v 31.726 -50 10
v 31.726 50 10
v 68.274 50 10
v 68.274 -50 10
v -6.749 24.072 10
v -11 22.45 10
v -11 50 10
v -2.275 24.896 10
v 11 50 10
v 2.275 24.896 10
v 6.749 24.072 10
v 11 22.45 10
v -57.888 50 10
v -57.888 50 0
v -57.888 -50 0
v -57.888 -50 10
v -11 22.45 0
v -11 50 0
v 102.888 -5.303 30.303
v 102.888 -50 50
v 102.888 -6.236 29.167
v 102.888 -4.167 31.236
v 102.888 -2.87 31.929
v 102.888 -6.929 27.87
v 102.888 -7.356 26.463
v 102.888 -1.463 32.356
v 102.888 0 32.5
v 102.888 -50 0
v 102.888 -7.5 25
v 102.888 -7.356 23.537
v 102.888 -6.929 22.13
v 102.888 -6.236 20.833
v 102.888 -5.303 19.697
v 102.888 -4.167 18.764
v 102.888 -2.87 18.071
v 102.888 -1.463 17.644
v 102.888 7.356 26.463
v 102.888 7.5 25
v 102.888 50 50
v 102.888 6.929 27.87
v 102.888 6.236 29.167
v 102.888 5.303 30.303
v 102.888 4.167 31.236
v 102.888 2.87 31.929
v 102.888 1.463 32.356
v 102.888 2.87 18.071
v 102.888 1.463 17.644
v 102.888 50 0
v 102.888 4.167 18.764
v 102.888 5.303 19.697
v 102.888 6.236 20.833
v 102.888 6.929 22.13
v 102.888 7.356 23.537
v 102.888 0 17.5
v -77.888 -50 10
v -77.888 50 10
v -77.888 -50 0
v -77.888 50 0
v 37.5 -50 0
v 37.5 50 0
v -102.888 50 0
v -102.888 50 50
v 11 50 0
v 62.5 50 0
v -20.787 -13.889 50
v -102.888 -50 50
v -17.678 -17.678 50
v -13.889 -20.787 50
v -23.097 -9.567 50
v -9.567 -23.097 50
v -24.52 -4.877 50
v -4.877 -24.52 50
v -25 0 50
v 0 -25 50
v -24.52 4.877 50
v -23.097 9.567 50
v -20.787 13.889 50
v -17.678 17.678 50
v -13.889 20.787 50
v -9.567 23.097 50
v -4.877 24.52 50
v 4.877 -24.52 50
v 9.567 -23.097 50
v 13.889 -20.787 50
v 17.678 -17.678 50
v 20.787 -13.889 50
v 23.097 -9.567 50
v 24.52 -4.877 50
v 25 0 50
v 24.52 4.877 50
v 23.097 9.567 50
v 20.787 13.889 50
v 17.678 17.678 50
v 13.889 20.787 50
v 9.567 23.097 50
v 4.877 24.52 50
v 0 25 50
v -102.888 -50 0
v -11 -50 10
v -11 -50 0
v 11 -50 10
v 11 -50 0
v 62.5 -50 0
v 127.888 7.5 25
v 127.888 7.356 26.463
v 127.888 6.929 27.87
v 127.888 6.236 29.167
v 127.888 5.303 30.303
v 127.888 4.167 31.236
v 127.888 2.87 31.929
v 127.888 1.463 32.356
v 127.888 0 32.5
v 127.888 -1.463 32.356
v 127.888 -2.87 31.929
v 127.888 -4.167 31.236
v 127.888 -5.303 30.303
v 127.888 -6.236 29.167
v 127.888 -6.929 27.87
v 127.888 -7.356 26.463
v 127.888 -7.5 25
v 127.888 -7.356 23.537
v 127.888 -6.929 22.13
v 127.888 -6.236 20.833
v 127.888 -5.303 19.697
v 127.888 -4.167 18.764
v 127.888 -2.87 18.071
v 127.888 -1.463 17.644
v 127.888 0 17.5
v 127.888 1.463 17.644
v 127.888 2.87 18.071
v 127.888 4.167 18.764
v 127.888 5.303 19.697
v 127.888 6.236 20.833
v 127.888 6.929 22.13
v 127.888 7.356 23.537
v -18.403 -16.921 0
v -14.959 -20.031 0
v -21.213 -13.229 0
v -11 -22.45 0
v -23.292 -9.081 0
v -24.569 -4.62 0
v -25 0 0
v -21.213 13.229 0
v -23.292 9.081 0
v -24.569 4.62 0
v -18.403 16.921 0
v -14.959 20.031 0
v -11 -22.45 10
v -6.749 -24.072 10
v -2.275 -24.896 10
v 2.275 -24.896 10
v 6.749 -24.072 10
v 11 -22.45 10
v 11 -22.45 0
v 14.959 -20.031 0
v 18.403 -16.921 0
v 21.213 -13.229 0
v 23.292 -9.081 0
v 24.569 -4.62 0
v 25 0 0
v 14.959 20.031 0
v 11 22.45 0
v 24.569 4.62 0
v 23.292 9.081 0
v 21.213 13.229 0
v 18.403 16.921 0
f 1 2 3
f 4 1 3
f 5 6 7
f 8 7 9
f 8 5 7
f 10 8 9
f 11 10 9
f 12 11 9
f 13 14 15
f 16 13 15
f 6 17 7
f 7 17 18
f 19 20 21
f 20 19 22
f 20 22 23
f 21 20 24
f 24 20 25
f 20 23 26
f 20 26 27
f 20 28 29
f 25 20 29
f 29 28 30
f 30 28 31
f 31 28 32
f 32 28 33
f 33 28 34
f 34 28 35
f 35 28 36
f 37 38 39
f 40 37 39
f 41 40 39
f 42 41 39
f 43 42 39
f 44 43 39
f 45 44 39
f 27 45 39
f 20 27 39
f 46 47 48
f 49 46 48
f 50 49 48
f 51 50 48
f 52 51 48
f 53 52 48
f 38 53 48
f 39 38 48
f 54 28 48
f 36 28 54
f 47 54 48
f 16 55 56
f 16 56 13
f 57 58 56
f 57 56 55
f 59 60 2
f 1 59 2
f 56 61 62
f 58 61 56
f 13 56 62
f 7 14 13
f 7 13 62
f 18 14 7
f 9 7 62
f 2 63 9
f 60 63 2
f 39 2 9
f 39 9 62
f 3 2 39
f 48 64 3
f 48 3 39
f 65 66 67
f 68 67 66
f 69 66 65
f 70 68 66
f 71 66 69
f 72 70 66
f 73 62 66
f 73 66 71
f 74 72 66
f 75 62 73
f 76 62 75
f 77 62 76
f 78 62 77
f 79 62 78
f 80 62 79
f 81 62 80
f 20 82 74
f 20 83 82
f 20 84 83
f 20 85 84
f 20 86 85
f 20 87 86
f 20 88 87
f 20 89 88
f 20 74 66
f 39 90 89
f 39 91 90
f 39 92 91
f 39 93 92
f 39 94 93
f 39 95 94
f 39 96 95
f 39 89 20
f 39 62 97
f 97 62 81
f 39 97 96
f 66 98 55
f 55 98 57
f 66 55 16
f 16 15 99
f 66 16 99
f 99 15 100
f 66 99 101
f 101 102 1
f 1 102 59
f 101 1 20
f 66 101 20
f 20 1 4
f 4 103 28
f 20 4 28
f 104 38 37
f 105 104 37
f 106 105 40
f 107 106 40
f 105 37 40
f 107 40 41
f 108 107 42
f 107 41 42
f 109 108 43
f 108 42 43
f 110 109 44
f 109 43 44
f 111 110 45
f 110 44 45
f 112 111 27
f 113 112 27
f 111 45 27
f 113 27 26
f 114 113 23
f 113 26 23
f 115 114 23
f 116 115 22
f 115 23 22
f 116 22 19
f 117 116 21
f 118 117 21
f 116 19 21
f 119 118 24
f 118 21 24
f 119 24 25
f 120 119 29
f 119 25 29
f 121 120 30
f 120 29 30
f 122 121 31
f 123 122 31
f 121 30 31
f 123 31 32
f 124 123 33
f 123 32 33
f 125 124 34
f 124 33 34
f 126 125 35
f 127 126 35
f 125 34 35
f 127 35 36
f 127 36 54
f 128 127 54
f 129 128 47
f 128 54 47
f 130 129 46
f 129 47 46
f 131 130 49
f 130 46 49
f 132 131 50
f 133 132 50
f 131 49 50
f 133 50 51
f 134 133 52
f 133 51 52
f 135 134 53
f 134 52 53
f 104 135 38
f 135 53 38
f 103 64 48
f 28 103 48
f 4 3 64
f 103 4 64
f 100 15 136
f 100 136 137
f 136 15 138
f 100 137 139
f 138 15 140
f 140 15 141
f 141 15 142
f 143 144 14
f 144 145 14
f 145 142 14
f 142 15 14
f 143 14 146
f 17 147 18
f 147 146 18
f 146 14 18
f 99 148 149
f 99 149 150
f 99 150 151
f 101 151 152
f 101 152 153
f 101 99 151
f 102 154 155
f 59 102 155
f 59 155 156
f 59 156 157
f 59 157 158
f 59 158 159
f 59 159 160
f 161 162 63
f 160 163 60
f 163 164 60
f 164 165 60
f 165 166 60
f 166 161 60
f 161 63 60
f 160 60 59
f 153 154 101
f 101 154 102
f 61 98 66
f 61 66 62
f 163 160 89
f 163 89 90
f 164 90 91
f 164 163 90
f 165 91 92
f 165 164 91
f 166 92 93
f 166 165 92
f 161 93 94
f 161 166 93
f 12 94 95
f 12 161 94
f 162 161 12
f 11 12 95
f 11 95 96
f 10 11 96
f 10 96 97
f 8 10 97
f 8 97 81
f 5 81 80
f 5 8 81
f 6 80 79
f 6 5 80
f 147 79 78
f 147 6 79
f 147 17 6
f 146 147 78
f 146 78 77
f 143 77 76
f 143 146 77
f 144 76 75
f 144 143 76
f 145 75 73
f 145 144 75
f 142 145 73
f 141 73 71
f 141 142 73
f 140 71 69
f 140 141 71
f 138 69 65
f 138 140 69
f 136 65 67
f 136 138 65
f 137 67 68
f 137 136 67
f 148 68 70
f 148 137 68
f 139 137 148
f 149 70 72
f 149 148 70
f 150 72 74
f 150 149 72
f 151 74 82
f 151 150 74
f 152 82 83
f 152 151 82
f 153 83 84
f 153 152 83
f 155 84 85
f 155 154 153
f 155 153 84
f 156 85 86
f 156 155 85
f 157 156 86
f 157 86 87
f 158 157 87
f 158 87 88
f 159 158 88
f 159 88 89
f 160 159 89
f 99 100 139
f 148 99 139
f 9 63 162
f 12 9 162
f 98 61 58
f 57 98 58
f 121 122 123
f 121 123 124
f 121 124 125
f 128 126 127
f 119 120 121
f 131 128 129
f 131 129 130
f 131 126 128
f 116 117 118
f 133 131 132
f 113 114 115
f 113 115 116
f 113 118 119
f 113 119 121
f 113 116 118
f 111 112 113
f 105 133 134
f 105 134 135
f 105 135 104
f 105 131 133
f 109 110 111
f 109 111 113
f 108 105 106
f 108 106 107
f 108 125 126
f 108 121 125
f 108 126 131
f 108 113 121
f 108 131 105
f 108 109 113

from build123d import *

# Parameters (mm, degrees)
F0_W     = 205.775664
F0_H     = 100
F0_R     = 25
F1_DEPTH = 50
F2_W     = 20
F2_H     = 100
F3_DEPTH = 10
F5_DEPTH = 100.001
F6_R     = 7.5
F7_DEPTH = 25


with BuildPart() as f1:
    # F0 (on Top) → F1 (new body)
    with BuildSketch(Plane.XY):
        Rectangle(F0_W, F0_H)
        Circle(F0_R, mode=Mode.SUBTRACT)
    extrude(amount=F1_DEPTH)

    # F2 (on face) → F3 (cut)
    with BuildSketch(Plane(origin=(0, 0, 0), x_dir=(1, 0, 0), z_dir=(0, 0, -1))):
        with Locations((-67.887832, 0)):
            Rectangle(F2_W, F2_H)
        with BuildLine():
            Line((11, 50), (-11, 50))
            Line((-11, 50), (-11, 22.449944))
            ThreePointArc((-11, 22.449944), (0, 25), (11, 22.449944))
            Line((11, 22.449944), (11, 50))
        make_face()
        with BuildLine():
            Line((-11, -22.449944), (-11, -50))
            Line((-11, -50), (11, -50))
            Line((11, -50), (11, -22.449944))
            ThreePointArc((11, -22.449944), (0, -25), (-11, -22.449944))
        make_face()
    extrude(amount=-F3_DEPTH, mode=Mode.SUBTRACT)

    # F4 (on face) → F5 (cut, through all)
    with BuildSketch(Plane(origin=(0, 50, 0), x_dir=(-1, 0, 0), z_dir=(0, 1, 0))):
        Polygon((-62.5, 0), (-37.5, 0), (-31.726497, 10), (-68.273503, 10), align=None)
    extrude(amount=-F5_DEPTH, mode=Mode.SUBTRACT)

    # F6 (on face) → F7 (join)
    with BuildSketch(Plane.YZ.offset(102.887832)):
        with Locations((0, 25)):
            Circle(F6_R)
    extrude(amount=F7_DEPTH)


solid = f1.part
